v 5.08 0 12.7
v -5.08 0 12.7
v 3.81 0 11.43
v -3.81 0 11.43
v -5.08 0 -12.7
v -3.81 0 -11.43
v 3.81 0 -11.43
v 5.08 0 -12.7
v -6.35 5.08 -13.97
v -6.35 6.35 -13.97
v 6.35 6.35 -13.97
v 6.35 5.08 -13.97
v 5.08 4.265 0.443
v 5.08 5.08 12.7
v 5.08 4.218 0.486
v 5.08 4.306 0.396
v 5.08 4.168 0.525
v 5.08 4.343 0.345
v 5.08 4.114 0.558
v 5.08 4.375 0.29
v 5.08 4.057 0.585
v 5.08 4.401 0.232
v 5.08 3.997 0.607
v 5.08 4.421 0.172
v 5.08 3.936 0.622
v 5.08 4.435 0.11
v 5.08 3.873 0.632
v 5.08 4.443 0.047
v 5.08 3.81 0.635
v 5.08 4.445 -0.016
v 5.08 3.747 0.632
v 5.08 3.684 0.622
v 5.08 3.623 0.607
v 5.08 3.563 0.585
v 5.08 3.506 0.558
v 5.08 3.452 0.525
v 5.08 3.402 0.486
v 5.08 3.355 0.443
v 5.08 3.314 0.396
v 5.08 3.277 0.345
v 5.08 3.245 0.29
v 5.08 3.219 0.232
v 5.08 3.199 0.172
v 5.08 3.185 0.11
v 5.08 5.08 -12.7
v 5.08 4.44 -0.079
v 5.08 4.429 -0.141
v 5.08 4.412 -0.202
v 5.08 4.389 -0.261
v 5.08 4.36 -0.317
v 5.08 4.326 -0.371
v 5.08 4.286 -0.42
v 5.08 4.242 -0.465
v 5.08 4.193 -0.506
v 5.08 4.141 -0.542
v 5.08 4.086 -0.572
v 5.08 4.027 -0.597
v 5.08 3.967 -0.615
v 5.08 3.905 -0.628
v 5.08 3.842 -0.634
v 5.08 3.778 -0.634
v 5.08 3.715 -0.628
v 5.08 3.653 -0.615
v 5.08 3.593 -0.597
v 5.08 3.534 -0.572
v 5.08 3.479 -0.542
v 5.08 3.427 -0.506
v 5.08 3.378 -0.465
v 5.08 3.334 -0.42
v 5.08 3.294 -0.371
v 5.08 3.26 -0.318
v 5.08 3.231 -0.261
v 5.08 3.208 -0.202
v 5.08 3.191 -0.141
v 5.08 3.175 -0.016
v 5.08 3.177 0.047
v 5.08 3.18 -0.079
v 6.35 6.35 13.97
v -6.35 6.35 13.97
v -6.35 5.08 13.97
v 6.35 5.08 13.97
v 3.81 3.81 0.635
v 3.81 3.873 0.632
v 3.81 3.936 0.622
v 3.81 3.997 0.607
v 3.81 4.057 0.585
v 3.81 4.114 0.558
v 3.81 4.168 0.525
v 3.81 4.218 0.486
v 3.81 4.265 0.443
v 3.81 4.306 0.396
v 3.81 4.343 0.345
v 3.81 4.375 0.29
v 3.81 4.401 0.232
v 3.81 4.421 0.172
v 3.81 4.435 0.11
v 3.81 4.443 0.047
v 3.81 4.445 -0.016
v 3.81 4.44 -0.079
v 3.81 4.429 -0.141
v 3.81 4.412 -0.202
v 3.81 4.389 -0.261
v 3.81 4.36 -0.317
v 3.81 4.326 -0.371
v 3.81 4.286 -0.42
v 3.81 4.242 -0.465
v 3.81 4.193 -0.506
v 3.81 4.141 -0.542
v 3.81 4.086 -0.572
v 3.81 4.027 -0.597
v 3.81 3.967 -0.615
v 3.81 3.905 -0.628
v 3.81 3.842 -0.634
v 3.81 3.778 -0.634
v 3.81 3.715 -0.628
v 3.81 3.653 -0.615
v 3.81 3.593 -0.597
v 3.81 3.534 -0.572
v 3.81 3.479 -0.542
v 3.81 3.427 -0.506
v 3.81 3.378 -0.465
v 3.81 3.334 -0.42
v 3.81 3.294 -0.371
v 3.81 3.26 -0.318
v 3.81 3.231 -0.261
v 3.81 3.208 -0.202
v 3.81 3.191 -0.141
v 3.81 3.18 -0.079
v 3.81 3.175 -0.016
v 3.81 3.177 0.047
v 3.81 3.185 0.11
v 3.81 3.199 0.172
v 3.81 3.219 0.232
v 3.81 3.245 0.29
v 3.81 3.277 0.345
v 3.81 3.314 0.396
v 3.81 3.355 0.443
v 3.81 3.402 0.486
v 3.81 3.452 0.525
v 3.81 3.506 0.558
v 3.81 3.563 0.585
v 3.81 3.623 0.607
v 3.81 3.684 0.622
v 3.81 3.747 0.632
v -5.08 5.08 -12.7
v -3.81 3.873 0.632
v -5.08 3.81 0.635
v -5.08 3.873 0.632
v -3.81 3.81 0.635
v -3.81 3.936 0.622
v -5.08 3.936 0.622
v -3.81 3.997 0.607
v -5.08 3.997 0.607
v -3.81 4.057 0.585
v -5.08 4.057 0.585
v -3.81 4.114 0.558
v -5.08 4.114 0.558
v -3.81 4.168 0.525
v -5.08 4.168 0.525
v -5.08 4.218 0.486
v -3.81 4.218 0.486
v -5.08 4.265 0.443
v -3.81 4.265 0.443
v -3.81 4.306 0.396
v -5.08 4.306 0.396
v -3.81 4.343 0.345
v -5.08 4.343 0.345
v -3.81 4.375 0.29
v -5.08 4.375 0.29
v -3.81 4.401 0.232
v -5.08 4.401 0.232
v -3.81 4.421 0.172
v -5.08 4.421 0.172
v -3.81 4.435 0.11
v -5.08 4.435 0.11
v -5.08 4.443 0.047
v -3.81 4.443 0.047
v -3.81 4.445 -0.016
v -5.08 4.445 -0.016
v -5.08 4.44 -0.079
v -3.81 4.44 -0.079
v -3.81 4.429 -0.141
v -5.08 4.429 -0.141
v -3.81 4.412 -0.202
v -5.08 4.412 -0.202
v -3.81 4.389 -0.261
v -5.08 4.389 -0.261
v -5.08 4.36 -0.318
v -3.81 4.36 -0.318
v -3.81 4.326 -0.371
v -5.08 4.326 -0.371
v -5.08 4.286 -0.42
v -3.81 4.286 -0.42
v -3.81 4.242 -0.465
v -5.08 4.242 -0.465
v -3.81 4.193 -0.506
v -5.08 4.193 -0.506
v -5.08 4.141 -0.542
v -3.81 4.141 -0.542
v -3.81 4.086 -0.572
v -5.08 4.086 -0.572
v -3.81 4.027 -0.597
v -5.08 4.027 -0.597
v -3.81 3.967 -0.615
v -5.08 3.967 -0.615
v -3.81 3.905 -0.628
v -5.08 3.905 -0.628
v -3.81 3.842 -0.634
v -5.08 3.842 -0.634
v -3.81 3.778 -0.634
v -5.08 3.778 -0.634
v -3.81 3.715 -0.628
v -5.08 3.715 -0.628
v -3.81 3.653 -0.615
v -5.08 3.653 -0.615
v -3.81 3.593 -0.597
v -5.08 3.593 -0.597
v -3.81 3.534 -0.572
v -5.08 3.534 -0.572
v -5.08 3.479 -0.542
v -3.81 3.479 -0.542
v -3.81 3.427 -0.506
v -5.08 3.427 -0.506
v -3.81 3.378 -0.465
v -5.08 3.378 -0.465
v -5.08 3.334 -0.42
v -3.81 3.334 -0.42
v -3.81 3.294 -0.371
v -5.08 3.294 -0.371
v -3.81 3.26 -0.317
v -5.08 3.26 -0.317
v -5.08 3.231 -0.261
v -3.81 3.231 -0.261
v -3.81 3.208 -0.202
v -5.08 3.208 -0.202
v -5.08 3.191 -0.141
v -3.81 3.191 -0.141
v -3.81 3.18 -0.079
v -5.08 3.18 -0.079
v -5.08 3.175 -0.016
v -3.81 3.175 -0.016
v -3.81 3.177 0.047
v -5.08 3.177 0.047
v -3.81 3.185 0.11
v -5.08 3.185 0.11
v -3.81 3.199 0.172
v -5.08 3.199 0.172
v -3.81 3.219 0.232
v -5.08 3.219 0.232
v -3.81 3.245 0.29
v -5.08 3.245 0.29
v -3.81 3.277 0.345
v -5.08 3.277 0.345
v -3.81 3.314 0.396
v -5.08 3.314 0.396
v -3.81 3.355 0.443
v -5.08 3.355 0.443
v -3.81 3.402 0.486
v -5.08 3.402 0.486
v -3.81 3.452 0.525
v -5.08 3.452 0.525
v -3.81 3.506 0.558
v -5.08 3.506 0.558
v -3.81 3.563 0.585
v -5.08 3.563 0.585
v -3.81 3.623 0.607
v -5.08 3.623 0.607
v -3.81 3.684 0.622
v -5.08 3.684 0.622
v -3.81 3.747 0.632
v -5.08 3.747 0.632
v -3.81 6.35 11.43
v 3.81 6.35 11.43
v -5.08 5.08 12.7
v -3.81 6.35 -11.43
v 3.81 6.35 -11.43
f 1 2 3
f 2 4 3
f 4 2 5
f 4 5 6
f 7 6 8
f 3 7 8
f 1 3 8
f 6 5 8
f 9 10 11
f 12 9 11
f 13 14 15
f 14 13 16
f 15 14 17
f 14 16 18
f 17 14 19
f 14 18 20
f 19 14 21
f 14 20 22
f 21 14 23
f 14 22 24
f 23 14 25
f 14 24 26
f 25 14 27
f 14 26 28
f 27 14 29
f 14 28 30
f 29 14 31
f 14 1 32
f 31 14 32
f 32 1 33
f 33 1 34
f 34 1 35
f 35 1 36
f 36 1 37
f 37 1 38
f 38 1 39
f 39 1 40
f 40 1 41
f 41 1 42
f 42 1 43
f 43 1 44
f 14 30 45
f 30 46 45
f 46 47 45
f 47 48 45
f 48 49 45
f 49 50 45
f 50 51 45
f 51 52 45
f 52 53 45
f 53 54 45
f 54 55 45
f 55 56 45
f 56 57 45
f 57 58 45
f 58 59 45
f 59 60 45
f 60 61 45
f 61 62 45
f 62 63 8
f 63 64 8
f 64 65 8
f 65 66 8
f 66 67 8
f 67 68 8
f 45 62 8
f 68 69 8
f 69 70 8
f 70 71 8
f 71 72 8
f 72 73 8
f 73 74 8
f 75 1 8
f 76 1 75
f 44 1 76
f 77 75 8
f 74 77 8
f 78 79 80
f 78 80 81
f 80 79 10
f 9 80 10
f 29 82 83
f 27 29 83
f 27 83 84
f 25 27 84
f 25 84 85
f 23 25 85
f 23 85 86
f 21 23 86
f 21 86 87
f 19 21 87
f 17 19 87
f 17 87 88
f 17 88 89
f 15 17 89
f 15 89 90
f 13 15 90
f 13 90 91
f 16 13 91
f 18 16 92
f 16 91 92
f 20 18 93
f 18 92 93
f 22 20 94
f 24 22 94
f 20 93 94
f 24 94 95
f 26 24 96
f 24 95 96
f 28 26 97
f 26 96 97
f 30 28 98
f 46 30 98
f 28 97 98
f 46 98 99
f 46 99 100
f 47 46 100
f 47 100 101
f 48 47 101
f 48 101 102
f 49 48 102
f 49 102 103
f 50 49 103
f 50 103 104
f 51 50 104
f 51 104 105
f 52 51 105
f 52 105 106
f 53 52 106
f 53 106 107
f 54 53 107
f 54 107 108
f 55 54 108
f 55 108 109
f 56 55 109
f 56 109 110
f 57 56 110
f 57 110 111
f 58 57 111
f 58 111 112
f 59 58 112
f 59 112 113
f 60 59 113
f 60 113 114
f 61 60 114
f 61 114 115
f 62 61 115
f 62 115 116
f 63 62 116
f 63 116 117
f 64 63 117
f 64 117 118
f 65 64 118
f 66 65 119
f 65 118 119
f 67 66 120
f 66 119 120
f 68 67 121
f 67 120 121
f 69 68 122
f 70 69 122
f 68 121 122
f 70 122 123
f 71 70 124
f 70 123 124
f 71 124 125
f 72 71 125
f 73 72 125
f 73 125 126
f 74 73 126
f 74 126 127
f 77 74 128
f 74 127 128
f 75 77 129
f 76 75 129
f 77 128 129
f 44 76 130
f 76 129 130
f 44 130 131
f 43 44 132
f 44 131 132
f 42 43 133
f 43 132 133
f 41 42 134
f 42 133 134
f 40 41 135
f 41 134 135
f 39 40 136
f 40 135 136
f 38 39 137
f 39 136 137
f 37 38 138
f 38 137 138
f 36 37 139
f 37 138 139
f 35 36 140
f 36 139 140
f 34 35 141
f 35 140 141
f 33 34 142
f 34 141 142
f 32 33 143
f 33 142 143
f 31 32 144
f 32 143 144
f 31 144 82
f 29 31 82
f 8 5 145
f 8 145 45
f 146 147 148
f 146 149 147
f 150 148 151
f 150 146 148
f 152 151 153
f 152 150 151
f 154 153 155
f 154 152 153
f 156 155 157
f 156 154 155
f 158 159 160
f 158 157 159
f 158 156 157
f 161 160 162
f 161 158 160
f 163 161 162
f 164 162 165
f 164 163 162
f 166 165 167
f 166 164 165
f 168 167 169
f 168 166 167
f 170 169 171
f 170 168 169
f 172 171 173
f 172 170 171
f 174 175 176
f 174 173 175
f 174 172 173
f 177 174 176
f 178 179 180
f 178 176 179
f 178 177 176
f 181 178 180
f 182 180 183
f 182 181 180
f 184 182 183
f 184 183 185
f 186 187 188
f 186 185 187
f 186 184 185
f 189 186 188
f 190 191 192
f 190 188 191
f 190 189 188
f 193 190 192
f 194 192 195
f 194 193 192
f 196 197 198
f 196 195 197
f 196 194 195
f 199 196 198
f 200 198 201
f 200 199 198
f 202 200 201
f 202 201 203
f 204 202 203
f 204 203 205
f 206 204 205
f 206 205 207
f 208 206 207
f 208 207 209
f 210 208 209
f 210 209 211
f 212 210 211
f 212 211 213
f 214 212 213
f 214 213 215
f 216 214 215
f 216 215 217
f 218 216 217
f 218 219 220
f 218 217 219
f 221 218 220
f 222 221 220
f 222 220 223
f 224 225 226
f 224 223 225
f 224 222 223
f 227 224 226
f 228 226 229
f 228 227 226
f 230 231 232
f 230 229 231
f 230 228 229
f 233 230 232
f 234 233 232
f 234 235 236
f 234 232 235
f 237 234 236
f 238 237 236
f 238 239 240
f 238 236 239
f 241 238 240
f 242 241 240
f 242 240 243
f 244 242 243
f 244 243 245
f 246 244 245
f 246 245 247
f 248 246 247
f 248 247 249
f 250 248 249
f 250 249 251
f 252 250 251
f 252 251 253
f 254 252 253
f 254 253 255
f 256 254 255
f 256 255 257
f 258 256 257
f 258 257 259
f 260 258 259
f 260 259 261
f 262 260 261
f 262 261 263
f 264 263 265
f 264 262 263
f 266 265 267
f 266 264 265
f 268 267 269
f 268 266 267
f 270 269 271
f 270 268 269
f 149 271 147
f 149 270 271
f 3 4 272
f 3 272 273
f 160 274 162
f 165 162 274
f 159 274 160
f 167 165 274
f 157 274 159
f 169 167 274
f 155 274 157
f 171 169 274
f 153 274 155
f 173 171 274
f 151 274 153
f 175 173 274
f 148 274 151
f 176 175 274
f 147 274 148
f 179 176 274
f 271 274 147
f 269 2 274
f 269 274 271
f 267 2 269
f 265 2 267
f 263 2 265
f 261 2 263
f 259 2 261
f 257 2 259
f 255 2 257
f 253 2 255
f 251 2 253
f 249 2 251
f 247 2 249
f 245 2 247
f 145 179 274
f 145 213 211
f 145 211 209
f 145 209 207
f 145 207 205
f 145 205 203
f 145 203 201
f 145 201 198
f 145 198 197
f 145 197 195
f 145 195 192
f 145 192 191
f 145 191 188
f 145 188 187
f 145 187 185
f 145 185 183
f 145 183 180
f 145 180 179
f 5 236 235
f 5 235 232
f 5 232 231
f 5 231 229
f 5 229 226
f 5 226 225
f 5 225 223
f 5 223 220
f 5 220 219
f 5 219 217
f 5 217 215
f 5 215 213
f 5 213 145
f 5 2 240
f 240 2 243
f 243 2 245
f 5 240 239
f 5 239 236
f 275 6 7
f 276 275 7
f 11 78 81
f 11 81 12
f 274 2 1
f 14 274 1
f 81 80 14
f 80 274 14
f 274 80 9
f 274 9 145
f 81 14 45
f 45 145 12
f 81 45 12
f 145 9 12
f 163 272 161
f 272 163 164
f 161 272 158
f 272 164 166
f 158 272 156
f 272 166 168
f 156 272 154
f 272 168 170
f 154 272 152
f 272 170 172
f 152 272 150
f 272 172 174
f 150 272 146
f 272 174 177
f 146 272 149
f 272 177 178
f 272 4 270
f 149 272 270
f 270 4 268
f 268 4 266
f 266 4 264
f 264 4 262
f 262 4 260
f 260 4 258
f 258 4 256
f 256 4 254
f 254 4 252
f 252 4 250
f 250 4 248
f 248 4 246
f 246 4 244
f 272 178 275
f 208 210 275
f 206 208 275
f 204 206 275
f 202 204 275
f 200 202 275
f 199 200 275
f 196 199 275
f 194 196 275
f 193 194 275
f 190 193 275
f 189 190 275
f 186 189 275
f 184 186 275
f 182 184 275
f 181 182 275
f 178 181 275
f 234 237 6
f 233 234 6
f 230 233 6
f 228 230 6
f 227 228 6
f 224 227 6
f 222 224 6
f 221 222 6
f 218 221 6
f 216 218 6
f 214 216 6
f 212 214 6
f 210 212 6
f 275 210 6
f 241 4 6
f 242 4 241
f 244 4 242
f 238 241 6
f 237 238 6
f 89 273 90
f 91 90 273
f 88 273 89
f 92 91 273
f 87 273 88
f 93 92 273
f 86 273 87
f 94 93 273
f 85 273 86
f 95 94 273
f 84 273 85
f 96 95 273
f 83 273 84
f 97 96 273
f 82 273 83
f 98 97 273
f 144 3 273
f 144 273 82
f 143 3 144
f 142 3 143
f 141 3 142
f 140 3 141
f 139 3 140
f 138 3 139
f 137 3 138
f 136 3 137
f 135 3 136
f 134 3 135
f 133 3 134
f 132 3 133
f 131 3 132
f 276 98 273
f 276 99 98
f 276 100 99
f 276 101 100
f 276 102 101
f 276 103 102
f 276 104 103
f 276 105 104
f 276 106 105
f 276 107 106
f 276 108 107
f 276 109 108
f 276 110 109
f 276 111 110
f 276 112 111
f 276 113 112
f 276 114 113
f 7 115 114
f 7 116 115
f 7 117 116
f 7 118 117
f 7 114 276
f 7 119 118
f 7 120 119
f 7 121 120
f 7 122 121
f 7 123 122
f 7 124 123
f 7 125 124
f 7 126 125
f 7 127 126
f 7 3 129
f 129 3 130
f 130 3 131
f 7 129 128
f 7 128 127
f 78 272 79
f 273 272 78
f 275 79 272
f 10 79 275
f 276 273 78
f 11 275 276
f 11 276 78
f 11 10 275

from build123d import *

# Parameters (mm, degrees)
SKETCH1_W               = 10.16
SKETCH1_H               = 25.4
SKETCH1_W_2             = 7.62
SKETCH1_H_2             = 22.86
BOSS_EXTRUDE1_DEPTH     = 6.35
SKETCH2_W               = 12.7
SKETCH2_H               = 27.94
SKETCH2_W_2             = 10.16
SKETCH2_H_2             = 25.4
BOSS_EXTRUDE2_DEPTH     = 1.27
SKETCH3_R               = 0.635
CUT_EXTRUDE1_DEPTH      = 11.16
CUT_EXTRUDE1_DEPTH_BACK = 3.54


with BuildPart() as part:
    # Sketch1 → Boss-Extrude1 (new body)
    with BuildSketch(Plane(origin=(0, 0, 0), x_dir=(1, 0, 0), z_dir=(0, 1, 0))):
        Rectangle(SKETCH1_W, SKETCH1_H)
        Rectangle(SKETCH1_W_2, SKETCH1_H_2, mode=Mode.SUBTRACT)
    extrude(amount=BOSS_EXTRUDE1_DEPTH)

    # Sketch2 → Boss-Extrude2 (add)
    with BuildSketch(Plane(origin=(0, 6.35, 0), x_dir=(1, 0, 0), z_dir=(0, 1, 0))):
        Rectangle(SKETCH2_W, SKETCH2_H)
        Rectangle(SKETCH2_W_2, SKETCH2_H_2, mode=Mode.SUBTRACT)
    extrude(amount=-BOSS_EXTRUDE2_DEPTH)

    # Sketch3 → Cut-Extrude1 (cut, two sides)
    with BuildSketch(Plane.ZY.offset(-3.81)) as cut_extrude1_sk:
        with Locations((0, 3.81)):
            Circle(SKETCH3_R)
    extrude(amount=CUT_EXTRUDE1_DEPTH, mode=Mode.SUBTRACT)
    extrude(cut_extrude1_sk.sketch, amount=-CUT_EXTRUDE1_DEPTH_BACK, mode=Mode.SUBTRACT)


solid = part.part
